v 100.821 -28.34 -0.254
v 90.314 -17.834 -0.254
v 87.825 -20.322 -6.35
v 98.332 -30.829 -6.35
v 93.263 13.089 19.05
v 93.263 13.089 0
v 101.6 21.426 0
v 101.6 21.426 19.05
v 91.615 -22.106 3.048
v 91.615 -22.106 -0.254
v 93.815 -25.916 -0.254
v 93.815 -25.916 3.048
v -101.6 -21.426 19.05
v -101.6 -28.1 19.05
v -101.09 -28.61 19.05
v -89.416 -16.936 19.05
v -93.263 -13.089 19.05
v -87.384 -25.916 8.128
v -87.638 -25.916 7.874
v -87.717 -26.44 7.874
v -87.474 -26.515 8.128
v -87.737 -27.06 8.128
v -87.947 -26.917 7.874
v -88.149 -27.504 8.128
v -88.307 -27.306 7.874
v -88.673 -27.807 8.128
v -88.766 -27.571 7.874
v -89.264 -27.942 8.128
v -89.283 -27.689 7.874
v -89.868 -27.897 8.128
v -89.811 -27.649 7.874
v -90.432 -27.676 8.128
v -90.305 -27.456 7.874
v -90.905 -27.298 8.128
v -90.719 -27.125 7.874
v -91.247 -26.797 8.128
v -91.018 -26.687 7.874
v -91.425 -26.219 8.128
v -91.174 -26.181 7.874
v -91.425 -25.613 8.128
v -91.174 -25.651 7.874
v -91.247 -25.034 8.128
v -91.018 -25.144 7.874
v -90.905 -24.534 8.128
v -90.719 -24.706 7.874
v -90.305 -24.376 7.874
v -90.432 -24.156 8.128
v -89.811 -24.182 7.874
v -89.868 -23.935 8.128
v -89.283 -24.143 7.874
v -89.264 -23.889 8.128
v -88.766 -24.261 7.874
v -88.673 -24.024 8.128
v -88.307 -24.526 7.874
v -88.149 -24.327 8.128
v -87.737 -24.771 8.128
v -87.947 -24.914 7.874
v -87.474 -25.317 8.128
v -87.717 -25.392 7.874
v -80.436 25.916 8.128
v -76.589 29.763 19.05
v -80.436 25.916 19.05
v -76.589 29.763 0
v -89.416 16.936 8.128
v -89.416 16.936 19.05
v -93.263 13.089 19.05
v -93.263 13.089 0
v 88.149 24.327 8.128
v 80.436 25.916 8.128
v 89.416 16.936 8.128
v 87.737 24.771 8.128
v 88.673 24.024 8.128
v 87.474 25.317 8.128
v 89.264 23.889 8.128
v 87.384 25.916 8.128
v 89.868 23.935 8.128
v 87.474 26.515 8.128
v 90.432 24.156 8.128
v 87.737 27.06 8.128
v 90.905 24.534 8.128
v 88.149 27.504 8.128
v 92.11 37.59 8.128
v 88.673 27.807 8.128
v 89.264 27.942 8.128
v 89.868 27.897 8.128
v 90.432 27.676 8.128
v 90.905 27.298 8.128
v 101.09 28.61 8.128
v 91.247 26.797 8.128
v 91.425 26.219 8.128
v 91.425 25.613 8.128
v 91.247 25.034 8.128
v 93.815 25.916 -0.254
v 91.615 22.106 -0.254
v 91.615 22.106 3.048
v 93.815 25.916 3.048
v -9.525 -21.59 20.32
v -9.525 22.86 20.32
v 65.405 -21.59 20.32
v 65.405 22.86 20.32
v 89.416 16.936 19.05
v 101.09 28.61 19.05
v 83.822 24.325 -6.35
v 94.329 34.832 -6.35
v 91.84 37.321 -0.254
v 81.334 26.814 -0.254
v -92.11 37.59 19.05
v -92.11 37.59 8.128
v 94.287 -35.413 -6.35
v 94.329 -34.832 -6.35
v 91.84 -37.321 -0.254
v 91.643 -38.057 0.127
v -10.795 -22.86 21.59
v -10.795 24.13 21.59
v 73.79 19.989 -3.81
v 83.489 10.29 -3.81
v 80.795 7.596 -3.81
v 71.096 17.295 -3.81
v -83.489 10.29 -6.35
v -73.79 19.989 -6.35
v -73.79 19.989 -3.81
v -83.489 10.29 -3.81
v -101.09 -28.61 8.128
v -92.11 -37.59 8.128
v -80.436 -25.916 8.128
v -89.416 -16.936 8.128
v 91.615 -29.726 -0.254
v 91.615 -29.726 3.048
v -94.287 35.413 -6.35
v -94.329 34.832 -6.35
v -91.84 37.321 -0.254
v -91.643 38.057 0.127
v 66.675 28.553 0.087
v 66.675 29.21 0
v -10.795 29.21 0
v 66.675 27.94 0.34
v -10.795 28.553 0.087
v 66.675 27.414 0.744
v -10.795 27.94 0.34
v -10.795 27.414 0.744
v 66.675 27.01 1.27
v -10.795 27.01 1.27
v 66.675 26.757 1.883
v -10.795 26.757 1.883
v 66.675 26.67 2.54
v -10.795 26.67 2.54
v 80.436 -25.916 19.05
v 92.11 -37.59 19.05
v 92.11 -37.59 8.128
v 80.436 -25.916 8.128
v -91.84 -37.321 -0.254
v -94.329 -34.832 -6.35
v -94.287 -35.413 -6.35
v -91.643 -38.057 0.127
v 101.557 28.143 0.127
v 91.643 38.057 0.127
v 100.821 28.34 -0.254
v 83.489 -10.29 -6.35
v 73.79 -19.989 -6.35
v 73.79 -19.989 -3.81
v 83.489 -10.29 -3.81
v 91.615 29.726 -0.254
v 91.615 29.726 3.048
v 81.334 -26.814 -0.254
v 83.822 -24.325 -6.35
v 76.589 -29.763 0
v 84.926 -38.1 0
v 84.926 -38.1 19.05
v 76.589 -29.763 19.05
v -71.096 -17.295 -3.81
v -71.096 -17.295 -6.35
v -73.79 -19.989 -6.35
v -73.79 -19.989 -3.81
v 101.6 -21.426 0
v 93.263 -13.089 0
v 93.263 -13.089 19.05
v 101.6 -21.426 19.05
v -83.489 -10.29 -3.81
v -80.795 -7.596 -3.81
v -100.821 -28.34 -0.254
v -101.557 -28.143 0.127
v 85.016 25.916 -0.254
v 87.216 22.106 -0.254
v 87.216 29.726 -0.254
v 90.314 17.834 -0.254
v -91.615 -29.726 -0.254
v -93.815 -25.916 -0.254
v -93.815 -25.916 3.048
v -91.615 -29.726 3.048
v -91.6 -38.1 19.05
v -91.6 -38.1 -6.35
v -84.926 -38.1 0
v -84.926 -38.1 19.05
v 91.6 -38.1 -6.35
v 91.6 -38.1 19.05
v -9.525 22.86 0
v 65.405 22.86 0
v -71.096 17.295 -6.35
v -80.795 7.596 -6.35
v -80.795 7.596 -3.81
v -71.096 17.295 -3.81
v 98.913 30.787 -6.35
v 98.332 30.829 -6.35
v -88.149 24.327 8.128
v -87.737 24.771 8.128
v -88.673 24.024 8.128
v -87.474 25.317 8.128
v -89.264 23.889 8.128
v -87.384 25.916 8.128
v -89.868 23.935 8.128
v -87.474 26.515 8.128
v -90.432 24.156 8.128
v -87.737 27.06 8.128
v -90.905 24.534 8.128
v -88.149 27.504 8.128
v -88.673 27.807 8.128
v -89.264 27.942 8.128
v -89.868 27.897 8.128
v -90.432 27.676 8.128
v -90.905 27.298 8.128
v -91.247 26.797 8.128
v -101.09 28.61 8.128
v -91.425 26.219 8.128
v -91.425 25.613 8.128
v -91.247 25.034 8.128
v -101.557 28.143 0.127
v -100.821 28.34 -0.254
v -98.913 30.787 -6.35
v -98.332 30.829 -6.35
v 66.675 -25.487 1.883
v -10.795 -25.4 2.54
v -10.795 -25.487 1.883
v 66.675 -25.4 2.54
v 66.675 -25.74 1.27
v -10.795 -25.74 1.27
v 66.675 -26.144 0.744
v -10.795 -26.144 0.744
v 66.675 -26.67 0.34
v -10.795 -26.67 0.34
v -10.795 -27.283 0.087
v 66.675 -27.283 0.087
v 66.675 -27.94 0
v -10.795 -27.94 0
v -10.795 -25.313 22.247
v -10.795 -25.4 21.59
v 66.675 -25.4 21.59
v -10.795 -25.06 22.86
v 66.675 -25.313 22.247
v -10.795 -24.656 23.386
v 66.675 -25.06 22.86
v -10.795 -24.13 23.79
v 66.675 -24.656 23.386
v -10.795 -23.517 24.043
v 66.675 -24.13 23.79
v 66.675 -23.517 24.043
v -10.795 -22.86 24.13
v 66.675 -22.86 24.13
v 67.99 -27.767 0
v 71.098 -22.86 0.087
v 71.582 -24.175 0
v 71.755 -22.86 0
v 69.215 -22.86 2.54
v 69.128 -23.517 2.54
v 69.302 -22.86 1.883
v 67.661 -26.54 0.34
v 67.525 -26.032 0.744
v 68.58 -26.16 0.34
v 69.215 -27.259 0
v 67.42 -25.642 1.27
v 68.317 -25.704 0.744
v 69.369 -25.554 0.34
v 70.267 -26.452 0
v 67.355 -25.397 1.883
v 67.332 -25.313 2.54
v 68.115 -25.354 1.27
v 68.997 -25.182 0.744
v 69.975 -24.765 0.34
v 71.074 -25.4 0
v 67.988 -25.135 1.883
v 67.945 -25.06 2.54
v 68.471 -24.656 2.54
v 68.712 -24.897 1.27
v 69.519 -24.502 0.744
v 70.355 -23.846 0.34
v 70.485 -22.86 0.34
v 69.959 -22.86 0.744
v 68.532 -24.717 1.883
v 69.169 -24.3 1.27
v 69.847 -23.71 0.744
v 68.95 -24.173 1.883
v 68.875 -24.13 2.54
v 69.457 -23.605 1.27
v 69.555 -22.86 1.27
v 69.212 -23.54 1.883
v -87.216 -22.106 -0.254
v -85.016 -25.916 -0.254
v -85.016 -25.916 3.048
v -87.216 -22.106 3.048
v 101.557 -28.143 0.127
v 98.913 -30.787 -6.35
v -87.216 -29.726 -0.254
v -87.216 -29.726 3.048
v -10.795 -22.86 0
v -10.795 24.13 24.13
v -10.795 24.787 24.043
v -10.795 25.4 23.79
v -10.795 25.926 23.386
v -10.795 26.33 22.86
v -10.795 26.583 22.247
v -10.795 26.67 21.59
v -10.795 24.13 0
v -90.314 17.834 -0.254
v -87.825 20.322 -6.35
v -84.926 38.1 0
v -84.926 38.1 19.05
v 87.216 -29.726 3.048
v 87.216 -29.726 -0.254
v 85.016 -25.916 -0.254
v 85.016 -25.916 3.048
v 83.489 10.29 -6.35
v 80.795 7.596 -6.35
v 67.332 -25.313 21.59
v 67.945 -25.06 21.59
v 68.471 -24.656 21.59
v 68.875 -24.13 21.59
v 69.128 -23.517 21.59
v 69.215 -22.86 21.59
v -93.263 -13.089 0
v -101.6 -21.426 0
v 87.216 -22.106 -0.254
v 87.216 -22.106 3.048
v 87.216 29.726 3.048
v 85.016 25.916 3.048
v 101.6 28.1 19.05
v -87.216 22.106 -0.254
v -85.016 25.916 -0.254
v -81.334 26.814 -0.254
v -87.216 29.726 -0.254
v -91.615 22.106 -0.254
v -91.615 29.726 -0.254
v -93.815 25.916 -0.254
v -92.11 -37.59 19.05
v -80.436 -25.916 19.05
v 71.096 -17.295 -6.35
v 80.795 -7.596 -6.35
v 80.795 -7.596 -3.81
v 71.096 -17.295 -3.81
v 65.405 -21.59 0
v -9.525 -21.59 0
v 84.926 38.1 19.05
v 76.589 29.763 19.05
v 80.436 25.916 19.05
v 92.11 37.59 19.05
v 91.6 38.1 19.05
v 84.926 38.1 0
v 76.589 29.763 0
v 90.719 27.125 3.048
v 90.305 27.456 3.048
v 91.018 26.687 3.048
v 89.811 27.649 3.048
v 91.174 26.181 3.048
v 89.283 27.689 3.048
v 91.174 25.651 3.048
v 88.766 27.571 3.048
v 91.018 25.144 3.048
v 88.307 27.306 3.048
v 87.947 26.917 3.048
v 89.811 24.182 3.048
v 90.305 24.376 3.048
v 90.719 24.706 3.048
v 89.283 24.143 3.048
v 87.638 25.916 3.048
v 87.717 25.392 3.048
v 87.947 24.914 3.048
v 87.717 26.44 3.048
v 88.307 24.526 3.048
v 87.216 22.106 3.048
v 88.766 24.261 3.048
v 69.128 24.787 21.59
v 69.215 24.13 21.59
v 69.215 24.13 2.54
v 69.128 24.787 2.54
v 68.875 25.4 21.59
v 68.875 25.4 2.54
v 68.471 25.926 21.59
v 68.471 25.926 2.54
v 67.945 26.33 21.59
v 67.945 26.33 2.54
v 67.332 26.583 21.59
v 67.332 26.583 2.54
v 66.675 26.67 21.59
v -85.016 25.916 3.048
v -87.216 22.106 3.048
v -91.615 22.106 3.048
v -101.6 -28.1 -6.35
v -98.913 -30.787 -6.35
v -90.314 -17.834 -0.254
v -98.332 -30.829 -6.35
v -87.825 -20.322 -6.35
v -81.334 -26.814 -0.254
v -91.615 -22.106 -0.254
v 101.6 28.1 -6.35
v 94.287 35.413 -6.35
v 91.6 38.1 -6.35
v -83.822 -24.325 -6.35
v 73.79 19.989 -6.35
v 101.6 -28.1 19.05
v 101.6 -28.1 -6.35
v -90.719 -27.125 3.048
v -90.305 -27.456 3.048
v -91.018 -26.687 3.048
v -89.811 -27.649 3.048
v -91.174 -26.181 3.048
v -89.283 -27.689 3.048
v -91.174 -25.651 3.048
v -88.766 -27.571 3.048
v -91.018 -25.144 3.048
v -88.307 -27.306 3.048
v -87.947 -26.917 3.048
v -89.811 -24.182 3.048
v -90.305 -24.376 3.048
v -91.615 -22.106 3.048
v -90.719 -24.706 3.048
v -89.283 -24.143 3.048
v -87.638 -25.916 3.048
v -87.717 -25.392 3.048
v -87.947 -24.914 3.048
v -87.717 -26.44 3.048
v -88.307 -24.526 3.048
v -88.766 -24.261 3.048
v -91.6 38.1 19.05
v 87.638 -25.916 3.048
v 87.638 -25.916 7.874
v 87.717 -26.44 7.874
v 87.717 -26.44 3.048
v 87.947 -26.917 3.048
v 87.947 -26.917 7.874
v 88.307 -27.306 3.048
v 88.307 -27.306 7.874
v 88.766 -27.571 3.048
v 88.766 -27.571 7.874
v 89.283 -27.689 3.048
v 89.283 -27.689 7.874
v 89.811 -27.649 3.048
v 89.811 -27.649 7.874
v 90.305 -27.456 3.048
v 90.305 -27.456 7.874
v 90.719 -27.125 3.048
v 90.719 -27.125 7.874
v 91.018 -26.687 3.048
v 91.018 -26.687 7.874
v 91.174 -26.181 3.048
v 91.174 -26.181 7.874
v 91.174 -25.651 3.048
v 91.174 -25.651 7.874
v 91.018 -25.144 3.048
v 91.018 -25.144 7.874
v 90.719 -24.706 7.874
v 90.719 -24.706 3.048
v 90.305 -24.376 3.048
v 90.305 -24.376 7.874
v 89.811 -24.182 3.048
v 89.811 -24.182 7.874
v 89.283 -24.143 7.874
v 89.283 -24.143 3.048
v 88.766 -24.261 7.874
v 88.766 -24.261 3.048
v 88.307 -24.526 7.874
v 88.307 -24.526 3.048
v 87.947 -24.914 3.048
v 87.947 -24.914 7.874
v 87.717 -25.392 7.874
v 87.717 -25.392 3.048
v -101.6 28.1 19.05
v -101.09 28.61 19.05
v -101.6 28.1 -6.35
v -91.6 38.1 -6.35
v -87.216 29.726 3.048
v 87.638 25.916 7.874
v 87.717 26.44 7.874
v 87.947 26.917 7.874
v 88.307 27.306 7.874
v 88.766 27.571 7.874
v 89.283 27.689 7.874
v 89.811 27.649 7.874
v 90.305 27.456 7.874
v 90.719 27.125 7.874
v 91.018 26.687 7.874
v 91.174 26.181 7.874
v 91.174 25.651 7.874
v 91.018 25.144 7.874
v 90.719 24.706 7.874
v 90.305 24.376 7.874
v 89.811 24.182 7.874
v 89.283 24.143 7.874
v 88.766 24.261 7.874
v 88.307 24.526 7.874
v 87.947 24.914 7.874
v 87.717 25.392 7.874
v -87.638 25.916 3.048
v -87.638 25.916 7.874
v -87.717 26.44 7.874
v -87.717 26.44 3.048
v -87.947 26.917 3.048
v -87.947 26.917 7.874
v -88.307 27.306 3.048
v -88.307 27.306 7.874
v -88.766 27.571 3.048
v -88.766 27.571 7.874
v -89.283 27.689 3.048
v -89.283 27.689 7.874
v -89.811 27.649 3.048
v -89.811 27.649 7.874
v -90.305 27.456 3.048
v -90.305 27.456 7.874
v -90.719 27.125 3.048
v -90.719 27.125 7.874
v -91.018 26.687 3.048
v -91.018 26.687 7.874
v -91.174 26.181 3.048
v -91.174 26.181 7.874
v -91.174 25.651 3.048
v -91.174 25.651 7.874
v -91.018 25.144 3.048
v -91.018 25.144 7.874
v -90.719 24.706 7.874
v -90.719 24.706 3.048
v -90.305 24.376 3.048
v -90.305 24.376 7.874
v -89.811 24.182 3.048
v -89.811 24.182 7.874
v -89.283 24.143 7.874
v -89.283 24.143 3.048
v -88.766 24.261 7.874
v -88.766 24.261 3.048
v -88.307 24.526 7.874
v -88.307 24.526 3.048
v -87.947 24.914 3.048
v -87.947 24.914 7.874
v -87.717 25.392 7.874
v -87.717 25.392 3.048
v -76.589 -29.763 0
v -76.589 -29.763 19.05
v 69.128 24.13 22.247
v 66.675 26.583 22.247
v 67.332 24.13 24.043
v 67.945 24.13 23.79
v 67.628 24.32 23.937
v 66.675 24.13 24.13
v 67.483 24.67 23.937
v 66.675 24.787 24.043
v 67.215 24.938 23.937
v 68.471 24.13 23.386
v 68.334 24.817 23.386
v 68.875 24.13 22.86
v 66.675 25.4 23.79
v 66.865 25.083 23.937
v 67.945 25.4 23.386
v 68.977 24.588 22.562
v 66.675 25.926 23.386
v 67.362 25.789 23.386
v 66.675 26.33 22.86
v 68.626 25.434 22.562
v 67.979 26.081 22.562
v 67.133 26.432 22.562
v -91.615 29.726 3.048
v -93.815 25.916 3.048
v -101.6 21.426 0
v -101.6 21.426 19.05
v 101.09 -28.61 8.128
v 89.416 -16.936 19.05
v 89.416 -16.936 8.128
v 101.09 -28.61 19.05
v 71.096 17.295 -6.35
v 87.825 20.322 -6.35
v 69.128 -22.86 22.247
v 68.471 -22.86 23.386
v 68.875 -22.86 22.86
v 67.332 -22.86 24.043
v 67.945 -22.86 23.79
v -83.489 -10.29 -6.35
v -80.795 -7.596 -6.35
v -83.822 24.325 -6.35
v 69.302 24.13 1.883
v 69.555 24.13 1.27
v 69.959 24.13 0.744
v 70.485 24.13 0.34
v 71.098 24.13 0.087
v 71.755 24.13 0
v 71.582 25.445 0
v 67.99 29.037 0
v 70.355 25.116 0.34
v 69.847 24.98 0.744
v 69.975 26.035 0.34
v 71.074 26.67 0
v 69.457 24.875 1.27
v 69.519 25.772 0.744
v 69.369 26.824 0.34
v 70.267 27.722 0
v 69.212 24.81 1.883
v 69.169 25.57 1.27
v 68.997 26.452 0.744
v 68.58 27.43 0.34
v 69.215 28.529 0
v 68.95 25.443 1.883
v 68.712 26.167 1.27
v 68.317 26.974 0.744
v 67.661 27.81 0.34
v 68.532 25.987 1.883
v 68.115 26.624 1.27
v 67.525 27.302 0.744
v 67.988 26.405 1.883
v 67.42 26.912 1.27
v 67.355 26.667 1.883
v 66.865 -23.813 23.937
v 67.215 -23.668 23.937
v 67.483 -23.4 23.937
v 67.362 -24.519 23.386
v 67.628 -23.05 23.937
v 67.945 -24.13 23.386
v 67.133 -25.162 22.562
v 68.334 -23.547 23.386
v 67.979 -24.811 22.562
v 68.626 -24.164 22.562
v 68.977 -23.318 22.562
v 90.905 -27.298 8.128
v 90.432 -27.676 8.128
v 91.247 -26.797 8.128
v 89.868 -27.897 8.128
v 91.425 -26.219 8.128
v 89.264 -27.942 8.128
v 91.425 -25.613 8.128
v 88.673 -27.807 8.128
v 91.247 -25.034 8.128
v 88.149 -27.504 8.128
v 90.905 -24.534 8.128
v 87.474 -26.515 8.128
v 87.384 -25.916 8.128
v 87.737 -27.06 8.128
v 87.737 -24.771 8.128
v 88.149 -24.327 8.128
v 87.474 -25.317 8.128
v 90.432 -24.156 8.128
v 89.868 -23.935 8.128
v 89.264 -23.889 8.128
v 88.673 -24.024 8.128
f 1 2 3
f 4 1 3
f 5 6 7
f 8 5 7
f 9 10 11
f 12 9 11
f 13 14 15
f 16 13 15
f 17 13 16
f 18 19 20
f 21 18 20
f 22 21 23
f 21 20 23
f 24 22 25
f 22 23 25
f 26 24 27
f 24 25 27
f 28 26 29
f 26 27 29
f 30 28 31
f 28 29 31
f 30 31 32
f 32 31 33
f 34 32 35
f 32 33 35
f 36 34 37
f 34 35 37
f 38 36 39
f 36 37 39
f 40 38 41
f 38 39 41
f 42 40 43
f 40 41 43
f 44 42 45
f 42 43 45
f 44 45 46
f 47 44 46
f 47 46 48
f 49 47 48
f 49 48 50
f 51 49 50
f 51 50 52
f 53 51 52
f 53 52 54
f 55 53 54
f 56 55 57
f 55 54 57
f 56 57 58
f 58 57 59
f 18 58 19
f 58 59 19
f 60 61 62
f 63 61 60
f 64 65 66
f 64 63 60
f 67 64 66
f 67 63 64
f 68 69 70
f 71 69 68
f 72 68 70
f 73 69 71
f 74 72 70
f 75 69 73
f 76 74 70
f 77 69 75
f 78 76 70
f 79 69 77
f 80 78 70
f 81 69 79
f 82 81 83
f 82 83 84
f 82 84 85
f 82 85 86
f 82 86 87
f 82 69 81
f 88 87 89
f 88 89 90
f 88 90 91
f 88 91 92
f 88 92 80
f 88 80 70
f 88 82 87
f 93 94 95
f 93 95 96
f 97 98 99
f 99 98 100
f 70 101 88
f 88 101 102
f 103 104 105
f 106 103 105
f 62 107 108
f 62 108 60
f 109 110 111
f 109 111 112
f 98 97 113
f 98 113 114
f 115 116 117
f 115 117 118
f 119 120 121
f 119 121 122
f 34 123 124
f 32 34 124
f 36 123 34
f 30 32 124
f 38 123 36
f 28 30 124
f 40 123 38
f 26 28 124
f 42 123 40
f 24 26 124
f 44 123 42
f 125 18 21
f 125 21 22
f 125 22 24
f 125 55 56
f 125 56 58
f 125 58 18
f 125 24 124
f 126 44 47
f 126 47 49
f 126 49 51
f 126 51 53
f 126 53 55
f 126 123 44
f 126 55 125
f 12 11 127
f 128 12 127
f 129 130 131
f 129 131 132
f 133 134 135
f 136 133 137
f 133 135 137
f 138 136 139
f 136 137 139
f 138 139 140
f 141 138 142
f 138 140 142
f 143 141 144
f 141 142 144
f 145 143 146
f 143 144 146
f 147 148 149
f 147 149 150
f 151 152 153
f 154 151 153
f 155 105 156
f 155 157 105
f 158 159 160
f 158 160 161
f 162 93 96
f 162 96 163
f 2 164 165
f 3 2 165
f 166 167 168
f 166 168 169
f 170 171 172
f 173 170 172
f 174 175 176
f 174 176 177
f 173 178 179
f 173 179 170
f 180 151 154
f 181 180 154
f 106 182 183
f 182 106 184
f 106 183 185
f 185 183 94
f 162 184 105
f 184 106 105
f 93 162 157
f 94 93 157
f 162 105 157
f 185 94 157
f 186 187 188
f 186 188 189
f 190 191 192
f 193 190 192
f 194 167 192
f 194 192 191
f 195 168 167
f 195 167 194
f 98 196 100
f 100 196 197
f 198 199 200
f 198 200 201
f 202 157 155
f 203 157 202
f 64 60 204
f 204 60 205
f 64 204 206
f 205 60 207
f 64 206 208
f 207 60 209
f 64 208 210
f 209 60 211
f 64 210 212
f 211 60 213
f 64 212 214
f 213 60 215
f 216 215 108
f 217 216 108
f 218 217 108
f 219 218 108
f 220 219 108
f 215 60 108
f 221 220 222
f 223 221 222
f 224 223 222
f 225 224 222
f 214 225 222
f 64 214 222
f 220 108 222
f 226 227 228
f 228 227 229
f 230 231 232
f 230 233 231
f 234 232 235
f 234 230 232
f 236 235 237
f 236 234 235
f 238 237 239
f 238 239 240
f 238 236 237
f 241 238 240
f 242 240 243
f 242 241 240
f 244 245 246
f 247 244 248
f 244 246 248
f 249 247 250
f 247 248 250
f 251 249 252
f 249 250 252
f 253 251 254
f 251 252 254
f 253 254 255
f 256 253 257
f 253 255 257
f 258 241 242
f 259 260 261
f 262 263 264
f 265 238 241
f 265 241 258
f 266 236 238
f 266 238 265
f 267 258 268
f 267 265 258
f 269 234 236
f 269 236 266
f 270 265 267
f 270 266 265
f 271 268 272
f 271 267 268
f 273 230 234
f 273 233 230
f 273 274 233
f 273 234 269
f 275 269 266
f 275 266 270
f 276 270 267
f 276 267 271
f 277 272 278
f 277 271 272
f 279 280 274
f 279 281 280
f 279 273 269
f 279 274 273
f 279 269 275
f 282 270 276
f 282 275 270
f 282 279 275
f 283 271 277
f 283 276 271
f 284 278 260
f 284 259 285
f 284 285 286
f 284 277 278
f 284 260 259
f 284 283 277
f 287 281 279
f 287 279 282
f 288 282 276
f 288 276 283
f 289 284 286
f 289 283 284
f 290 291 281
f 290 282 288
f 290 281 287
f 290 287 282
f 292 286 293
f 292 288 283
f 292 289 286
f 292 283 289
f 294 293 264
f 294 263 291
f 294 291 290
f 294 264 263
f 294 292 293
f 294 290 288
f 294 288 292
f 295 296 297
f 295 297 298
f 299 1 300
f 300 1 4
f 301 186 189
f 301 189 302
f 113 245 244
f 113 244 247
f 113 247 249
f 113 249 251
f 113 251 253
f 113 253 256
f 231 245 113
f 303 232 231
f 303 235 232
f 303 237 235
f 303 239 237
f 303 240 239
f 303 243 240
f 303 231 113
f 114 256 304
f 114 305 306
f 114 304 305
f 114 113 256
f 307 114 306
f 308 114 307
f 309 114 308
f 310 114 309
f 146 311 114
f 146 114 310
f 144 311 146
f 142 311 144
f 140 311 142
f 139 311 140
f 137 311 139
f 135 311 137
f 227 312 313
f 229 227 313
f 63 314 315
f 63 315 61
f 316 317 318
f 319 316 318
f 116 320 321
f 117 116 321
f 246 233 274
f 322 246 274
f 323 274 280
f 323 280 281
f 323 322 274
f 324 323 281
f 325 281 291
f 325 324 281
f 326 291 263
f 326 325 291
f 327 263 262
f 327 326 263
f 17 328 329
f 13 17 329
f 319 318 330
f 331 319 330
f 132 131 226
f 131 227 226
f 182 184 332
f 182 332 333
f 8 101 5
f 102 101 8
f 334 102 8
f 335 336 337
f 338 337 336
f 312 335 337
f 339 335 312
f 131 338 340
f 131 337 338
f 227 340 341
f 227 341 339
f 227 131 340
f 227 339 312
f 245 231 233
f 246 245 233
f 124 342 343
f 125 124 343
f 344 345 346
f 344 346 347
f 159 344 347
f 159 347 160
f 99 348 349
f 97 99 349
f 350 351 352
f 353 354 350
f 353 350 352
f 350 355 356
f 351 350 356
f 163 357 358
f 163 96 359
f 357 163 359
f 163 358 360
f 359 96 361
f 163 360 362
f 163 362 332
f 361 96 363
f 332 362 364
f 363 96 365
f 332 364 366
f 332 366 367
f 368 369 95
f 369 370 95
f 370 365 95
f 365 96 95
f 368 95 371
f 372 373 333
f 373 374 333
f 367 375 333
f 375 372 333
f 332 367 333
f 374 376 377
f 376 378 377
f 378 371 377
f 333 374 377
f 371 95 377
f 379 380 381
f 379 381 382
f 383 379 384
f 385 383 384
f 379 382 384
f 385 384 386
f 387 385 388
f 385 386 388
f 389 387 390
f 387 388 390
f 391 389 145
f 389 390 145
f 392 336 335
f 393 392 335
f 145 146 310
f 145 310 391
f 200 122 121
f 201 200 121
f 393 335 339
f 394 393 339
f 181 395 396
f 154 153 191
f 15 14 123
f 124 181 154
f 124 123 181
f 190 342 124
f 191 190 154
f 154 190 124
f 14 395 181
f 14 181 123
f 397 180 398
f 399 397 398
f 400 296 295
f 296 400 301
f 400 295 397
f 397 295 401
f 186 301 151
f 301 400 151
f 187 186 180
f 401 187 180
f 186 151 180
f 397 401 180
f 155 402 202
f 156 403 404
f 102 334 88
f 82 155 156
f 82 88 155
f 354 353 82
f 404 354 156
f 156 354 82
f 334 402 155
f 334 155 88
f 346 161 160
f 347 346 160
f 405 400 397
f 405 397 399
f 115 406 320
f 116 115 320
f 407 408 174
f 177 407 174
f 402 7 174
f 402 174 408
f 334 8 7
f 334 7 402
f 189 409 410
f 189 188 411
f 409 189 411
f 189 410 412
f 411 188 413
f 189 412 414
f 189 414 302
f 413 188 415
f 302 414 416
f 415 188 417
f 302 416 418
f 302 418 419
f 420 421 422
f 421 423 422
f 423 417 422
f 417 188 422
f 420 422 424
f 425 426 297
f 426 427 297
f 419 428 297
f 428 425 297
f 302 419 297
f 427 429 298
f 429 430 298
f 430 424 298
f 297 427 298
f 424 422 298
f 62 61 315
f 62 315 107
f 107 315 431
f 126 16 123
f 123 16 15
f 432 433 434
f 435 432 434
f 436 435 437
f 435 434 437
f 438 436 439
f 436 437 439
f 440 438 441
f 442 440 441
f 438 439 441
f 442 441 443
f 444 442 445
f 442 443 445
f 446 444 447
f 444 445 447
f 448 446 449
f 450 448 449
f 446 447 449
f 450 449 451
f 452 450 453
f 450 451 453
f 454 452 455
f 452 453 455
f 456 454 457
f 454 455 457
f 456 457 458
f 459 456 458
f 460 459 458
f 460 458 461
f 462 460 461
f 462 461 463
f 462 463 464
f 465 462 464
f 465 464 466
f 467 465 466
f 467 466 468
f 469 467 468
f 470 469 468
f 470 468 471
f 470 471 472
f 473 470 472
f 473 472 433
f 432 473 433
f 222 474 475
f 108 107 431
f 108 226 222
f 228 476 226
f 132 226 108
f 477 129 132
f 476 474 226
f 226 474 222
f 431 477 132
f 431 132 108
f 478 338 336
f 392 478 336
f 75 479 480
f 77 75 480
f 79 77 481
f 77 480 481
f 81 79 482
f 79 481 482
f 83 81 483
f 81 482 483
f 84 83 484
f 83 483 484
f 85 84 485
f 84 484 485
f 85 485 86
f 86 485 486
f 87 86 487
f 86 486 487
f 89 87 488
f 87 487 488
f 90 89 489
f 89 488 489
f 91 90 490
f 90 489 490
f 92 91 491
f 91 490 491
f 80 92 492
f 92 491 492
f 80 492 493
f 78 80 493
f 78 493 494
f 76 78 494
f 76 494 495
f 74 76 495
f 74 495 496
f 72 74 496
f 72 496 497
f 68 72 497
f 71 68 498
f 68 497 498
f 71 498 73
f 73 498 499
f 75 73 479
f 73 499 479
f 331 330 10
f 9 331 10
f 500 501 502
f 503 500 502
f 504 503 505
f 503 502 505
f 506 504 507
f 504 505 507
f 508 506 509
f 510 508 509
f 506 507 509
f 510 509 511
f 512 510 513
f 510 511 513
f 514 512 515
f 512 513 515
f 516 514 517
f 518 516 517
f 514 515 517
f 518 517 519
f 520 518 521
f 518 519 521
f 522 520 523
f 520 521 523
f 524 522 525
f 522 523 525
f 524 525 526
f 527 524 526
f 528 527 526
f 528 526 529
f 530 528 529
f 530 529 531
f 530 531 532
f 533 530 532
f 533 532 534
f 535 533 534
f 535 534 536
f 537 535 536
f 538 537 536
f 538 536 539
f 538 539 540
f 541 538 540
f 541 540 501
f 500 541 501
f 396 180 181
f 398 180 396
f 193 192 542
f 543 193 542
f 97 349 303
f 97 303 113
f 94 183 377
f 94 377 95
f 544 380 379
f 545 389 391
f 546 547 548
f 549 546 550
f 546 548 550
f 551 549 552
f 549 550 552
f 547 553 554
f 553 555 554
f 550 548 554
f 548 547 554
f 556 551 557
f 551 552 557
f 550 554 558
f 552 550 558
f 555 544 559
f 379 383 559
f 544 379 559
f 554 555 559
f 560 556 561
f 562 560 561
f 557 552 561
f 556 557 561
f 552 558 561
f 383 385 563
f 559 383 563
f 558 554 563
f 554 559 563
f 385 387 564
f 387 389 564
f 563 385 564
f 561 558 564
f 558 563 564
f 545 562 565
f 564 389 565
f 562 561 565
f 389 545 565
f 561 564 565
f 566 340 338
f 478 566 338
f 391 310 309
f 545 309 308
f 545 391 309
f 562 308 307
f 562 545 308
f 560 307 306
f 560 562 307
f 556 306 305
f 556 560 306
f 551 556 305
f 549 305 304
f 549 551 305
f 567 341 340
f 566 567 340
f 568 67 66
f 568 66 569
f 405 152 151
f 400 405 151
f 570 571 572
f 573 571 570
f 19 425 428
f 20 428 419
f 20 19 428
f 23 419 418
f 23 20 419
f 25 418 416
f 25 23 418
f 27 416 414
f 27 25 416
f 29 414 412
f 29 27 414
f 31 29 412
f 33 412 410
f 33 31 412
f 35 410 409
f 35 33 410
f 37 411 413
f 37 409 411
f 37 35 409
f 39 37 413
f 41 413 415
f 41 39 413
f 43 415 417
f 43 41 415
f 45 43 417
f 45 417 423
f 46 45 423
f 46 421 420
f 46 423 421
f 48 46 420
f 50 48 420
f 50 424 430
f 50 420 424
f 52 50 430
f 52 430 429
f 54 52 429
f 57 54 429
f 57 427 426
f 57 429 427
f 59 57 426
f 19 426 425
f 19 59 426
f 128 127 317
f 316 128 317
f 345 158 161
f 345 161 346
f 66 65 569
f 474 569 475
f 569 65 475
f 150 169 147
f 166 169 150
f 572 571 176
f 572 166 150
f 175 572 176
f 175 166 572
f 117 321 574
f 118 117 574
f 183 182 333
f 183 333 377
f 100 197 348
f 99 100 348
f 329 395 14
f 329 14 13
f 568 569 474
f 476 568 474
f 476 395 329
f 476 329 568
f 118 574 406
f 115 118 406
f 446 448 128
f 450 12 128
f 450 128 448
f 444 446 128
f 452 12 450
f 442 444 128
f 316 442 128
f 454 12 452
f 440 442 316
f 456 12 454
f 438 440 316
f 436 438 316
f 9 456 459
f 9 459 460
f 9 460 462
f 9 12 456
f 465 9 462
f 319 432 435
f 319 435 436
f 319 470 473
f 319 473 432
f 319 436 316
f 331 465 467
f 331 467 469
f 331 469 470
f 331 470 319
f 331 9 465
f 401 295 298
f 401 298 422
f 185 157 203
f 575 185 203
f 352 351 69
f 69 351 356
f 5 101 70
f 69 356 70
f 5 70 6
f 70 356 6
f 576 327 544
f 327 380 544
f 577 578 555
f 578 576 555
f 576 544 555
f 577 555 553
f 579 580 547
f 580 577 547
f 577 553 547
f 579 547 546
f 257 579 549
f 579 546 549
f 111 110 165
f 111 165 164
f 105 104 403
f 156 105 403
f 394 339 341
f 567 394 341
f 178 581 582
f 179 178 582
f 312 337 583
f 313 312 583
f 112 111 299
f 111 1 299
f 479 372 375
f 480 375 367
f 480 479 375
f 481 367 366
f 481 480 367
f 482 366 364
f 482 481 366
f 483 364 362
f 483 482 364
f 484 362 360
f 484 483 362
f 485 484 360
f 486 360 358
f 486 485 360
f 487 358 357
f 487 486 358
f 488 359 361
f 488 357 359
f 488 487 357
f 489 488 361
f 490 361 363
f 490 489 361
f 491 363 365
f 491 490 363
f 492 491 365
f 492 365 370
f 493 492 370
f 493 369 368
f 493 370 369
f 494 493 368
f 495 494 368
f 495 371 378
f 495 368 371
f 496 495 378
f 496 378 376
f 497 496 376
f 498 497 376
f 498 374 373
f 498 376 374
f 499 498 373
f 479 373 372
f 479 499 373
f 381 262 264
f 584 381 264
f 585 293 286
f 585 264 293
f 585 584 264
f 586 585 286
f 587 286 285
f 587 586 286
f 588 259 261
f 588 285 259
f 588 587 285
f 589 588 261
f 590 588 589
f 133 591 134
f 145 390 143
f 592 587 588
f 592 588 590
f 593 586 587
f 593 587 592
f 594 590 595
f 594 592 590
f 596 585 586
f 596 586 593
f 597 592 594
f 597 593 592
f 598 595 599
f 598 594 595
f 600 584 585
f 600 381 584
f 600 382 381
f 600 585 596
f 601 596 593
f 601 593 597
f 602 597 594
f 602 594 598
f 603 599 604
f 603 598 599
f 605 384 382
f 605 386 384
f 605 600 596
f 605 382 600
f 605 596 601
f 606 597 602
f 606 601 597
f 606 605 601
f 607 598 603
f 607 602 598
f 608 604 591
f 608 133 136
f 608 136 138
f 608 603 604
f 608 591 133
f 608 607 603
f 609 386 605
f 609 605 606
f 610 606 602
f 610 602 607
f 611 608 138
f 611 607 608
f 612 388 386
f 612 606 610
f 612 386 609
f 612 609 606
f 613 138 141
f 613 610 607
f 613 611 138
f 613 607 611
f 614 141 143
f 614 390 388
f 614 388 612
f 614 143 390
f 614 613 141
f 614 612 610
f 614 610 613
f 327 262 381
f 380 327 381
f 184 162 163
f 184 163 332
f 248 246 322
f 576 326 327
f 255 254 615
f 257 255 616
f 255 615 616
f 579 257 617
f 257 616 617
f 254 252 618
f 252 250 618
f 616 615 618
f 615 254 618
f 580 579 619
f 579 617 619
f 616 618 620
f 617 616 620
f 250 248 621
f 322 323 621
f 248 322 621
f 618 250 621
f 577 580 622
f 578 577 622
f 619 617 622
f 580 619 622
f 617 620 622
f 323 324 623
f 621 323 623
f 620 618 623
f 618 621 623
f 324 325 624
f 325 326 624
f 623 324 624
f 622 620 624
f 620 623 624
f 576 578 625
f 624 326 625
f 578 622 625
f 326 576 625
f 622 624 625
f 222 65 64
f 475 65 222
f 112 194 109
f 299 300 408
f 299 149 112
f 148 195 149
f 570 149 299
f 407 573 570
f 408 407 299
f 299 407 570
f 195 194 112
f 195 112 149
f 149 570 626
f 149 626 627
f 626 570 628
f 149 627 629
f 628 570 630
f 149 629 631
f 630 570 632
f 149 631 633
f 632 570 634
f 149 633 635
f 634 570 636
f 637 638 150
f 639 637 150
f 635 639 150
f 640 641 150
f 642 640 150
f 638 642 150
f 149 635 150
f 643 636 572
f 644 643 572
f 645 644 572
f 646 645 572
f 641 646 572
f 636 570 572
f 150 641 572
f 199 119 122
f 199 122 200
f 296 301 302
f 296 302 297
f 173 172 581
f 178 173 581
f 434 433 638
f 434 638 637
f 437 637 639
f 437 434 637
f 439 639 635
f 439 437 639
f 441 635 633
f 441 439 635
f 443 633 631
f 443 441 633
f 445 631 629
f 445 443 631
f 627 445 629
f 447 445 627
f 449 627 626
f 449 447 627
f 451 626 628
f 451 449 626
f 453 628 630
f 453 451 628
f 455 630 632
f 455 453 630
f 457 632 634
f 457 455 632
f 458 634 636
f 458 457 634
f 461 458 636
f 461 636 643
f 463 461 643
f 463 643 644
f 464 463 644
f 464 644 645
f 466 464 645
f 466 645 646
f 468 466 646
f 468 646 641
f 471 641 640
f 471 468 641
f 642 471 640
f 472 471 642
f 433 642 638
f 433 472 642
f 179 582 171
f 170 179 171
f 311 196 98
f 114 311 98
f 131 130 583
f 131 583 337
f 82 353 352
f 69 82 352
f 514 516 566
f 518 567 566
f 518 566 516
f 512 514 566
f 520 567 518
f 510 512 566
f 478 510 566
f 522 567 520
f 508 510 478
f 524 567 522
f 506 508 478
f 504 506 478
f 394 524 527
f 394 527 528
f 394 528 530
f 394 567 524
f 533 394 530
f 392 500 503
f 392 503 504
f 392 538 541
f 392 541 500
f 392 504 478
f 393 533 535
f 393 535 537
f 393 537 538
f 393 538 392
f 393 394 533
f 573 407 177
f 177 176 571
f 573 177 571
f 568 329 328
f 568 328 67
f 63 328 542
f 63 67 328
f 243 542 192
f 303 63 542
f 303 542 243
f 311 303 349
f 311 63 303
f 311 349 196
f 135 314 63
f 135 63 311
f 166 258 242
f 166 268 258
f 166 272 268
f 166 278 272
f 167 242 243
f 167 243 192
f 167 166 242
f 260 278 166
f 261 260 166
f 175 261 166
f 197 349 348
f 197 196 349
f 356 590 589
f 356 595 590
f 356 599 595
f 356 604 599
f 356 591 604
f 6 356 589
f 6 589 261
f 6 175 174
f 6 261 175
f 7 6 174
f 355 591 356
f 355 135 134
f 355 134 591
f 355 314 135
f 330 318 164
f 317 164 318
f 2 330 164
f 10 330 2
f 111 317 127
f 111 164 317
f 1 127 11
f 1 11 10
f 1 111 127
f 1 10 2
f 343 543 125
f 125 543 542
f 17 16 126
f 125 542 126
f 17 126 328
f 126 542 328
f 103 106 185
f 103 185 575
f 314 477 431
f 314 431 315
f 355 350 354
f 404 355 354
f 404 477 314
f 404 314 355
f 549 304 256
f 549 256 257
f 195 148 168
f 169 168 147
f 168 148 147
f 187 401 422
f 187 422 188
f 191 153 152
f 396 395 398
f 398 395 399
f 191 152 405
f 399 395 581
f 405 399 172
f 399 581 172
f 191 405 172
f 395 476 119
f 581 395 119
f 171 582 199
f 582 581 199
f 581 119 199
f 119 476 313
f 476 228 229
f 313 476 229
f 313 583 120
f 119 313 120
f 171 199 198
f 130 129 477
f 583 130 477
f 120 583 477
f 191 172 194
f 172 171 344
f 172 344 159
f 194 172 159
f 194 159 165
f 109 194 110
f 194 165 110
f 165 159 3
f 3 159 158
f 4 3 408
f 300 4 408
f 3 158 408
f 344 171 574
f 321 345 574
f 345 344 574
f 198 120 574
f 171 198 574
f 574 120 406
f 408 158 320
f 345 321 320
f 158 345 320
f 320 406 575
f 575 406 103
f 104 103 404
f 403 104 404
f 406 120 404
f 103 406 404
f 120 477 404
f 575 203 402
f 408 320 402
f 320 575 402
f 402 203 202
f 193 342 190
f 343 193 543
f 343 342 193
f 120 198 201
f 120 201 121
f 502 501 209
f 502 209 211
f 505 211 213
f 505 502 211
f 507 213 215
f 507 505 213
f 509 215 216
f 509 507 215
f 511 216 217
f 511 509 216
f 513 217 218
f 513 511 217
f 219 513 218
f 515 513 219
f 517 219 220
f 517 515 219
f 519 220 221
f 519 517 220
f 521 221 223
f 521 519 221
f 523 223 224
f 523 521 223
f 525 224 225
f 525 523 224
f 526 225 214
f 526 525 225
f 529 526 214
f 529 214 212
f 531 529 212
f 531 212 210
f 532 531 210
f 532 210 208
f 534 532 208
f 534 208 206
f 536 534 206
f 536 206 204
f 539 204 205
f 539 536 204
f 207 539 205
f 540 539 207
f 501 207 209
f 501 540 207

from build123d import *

# Parameters (mm, degrees)
BOSS_EXTRUDE1_DEPTH     = 27.432
BOSS_EXTRUDE2_DEPTH     = 5.08
SKETCH4_R               = 1.524
CUT_EXTRUDE1_DEPTH      = 2.286
SKETCH4_4_R             = 1.524
CUT_EXTRUDE2_DEPTH      = 63.630575033
BOSS_EXTRUDE3_DEPTH     = 3.81
FILLET1_R               = 2.54
CHAMFER3_SIZE           = 1.27
CHAMFER4_SIZE           = 0.254
SKETCH8_W               = 101.6
SKETCH8_H               = 44.45
CUT_EXTRUDE3_DEPTH      = 5.08
CHAMFER5_SIZE           = 1.27
BOSS_EXTRUDE4_DEPTH     = 6.35
FILLET2_R               = 1.27
BOSS_EXTRUDE5_DEPTH     = 19.05
CUT_EXTRUDE4_DEPTH      = 15.24
MIRROR3_COPY_1_DEPTH    = 15.24
CHAMFER7_SIZE           = 0.381
CUT_EXTRUDE6_DEPTH      = 2.54
MIRROR5_COPY_1_DEPTH    = 2.54
CUT_EXTRUDE7_DEPTH      = 10.922
SKETCH18_R              = 1.778
CUT_EXTRUDE8_DEPTH      = 8.382
MIRROR7_COPY_1_SKETCH_R = 1.778
MIRROR7_COPY_1_DEPTH    = 8.382
SKETCH19_W              = 135.869666512
SKETCH19_H              = 67.345799606
CUT_EXTRUDE9_DEPTH      = 31.242
BOSS_EXTRUDE6_DEPTH     = 20.32
SKETCH21_W              = 80.01
SKETCH21_H              = 52.07
BOSS_EXTRUDE7_DEPTH     = 3.81
FILLET3_R               = 2.54
CHAMFER8_SIZE           = 1.27
CHAMFER9_SIZE           = 0.254
CUT_EXTRUDE10_DEPTH     = 3.302
MIRROR9_COPY_1_DEPTH    = 3.302


with BuildPart() as part:
    # Sketch1 → Boss-Extrude1 (new body)
    with BuildSketch(Plane(origin=(10.858740921, 0, 0), x_dir=(1, 0, 0), z_dir=(0, 0, 1))):
        Polygon((-52.705, 25.4), (-52.705, 21.59), (48.895, 21.59), (48.895, -22.86), (-52.705, -22.86), (-52.705, -25.4), (52.705, -25.4), (52.705, 25.4), align=None)
    extrude(amount=BOSS_EXTRUDE1_DEPTH)

    # Sketch1<3> → Boss-Extrude2 (add)
    with BuildSketch(Plane(origin=(10.858740921, 0, 0), x_dir=(1, 0, 0), z_dir=(0, 0, 1))):
        Polygon((48.895, 21.59), (-52.705, 21.59), (-52.705, 13.97), (-6.985, 13.97), (-6.985, -6.35), (-52.705, -6.35), (-52.705, -22.86), (48.895, -22.86), align=None)
    extrude(amount=BOSS_EXTRUDE2_DEPTH)

    # Sketch4 → Cut-Extrude1 (cut)
    # profile 1 of 4: a face of its own
    with BuildSketch(Plane(origin=(10.858740921, 0, 5.08), x_dir=(1, 0, 0), z_dir=(0, 0, 1))):
        Polygon((-44.785877438, 21.59), (-47.924122562, 21.59), (-49.493245123, 18.8722), (-47.924122562, 16.1544), (-44.785877438, 16.1544), (-43.216754877, 18.8722), align=None)
        with Locations((-46.355, 18.8722)):
            Circle(SKETCH4_R, mode=Mode.SUBTRACT)
    # profile 2 of 4: a face of its own
    with BuildSketch(Plane(origin=(10.858740921, 0, 5.08), x_dir=(1, 0, 0), z_dir=(0, 0, 1))):
        Polygon((21.126640721, 16.1544), (17.988395597, 16.1544), (16.419273036, 18.8722), (17.988395597, 21.59), (21.126640721, 21.59), (22.695763282, 18.8722), align=None)
        with Locations((19.557518159, 18.8722)):
            Circle(SKETCH4_R, mode=Mode.SUBTRACT)
    # profile 3 of 4: a face of its own
    with BuildSketch(Plane(origin=(10.858740921, 0, 5.08), x_dir=(1, 0, 0), z_dir=(0, 0, 1))):
        Polygon((22.695763282, -18.8722), (21.126640721, -16.1544), (17.988395597, -16.1544), (16.419273036, -18.8722), (17.988395597, -21.59), (21.126640721, -21.59), align=None)
        with Locations((19.557518159, -18.8722)):
            Circle(SKETCH4_R, mode=Mode.SUBTRACT)
    # profile 4 of 4: a face of its own
    with BuildSketch(Plane(origin=(10.858740921, 0, 5.08), x_dir=(1, 0, 0), z_dir=(0, 0, 1))):
        Polygon((-49.493245123, -18.8722), (-47.924122562, -16.1544), (-44.785877438, -16.1544), (-43.216754877, -18.8722), (-44.785877438, -21.59), (-47.924122562, -21.59), align=None)
        with Locations((-46.355, -18.8722)):
            Circle(SKETCH4_R, mode=Mode.SUBTRACT)
    extrude(amount=-CUT_EXTRUDE1_DEPTH, mode=Mode.SUBTRACT)

    # Sketch4<4> → Cut-Extrude2 (cut, through all)
    with BuildSketch(Plane(origin=(10.858740921, 0, 5.08), x_dir=(1, 0, 0), z_dir=(0, 0, 1))):
        with Locations((-46.355, 18.8722)):
            Circle(SKETCH4_4_R)
        with Locations((19.557518159, 18.8722)):
            Circle(SKETCH4_4_R)
        with Locations((-46.355, -18.8722)):
            Circle(SKETCH4_4_R)
        with Locations((19.557518159, -18.8722)):
            Circle(SKETCH4_4_R)
    extrude(amount=-CUT_EXTRUDE2_DEPTH, mode=Mode.SUBTRACT)

    # Sketch7 → Boss-Extrude3 (add)
    with BuildSketch(Plane(origin=(10.858740921, 0, 27.432), x_dir=(1, 0, 0), z_dir=(0, 0, 1))):
        Polygon((-52.705, 25.4), (52.705, 25.4), (52.705, -25.4), (-52.705, -25.4), (-52.705, -6.35), (-46.355, -6.35), (-46.355, 6.35), (-52.705, 6.35), align=None)
    extrude(amount=BOSS_EXTRUDE3_DEPTH)

    # Fillet1
    fillet1_edges = [part.edges().sort_by_distance(p)[0] for p in [
        (63.563740921, 25.4, 15.621),
        (63.563740921, -25.4, 15.621),
        (10.858740921, -25.4, 31.242),
        (63.563740921, 0, 31.242),
        (10.858740921, 25.4, 31.242),
    ]]
    fillet(fillet1_edges, radius=FILLET1_R)

    # Chamfer3
    chamfer3_edges = [part.edges().sort_by_distance(p)[0] for p in [
        (-41.846259079, 13.97, 27.432),
        (-41.846259079, 6.35, 29.337),
        (-41.846259079, 21.59, 16.256),
        (-41.846259079, -14.605, 27.432),
        (-41.846259079, -6.35, 29.337),
        (-38.671259079, 6.35, 31.242),
        (-35.496259079, 0, 31.242),
        (-38.671259079, -6.35, 31.242),
        (-41.846259079, -22.86, 16.256),
    ]]
    chamfer(chamfer3_edges, length=CHAMFER3_SIZE)

    # Chamfer4
    chamfer4_edges = [part.edges().sort_by_distance(p)[0] for p in [
        (28.892259079, 18.8722, 0),
        (-37.020259079, -18.8722, 0),
        (28.892259079, -18.8722, 0),
        (-37.020259079, 18.8722, 0),
    ]]
    chamfer(chamfer4_edges, length=CHAMFER4_SIZE)

    # Sketch8 → Cut-Extrude3 (cut)
    with BuildSketch(Plane(origin=(10.858740921, 0, 5.08), x_dir=(1, 0, 0), z_dir=(0, 0, 1))):
        with Locations((-1.905, -0.635)):
            Rectangle(SKETCH8_W, SKETCH8_H)
    extrude(amount=-CUT_EXTRUDE3_DEPTH, mode=Mode.SUBTRACT)

    # Chamfer5
    chamfer5_edges = [part.edges().sort_by_distance(p)[0] for p in [
        (-41.846259079, -22.86, 2.54),
        (-41.846259079, 21.59, 2.54),
    ]]
    chamfer(chamfer5_edges, length=CHAMFER5_SIZE)

    # Sketch9 → Boss-Extrude4 (add)
    with BuildSketch(Plane(origin=(10.858740921, 0, 0), x_dir=(-1, 0, 0), z_dir=(0, 0, -1))):
        Polygon((-90.741259079, 28.1), (-80.741259079, 38.1), (102.458740921, 38.1), (112.458740921, 28.1), (112.458740921, -28.1), (102.458740921, -38.1), (-80.741259079, -38.1), (-90.741259079, -28.1), align=None)
    extrude(amount=BOSS_EXTRUDE4_DEPTH)

    # Fillet2
    fillet2_edges = [part.edges().sort_by_distance(p)[0] for p in [
        (9.588740921, -25.4, 0),
        (63.563740921, 0, 0),
        (9.588740921, 25.4, 0),
        (62.819792145, 24.656051224, 0),
        (62.819792145, -24.656051224, 0),
    ]]
    fillet(fillet2_edges, radius=FILLET2_R)

    # Sketch11 → Boss-Extrude5 (add)
    with BuildSketch(Plane.XY):
        Polygon((-101.6, 28.1), (-91.6, 38.1), (-84.925667043, 38.1), (-76.588500564, 29.762833521), (-93.262833521, 13.088500564), (-101.6, 21.425667043), align=None)
        Polygon((84.925667043, 38.1), (76.588500564, 29.762833521), (93.262833521, 13.088500564), (101.6, 21.425667043), (101.6, 28.1), (91.6, 38.1), align=None)
        Polygon((91.6, -38.1), (84.925667043, -38.1), (76.588500564, -29.762833521), (93.262833521, -13.088500564), (101.6, -21.425667043), (101.6, -28.1), align=None)
        Polygon((-84.925667043, -38.1), (-76.588500564, -29.762833521), (-93.262833521, -13.088500564), (-101.6, -21.425667043), (-101.6, -28.1), (-91.6, -38.1), align=None)
    extrude(amount=BOSS_EXTRUDE5_DEPTH)

    # Sketch13 → Cut-Extrude4 (cut)
    with BuildSketch(Plane(origin=(-64.85, 64.85, 0), x_dir=(0, 0, 1), z_dir=(-0.7071067811865477, 0.7071067811865474, 0))):
        Polygon((-6.35, -44.901280605), (-6.35, -42.070807846), (-0.254, -38.551280605), (-0.254, -51.251280605), (-6.35, -47.731753364), align=None)
    cut_extrude4 = extrude(amount=-CUT_EXTRUDE4_DEPTH, mode=Mode.SUBTRACT)

    # Mirror2: Cut-Extrude4 across plane
    add(cut_extrude4.mirror(Plane.ZX), mode=Mode.SUBTRACT)

    # Mirror3: Cut-Extrude4 across plane
    add(cut_extrude4.mirror(Plane(origin=(0, 0, 0), x_dir=(0, 0, 1), z_dir=(1, 0, 0))), mode=Mode.SUBTRACT)

    # Mirror3 copy 1 sketch → Mirror3 copy 1 (cut)
    with BuildSketch(Plane(origin=(64.85, -64.85, 0), x_dir=(0, 0, 1), z_dir=(0.7071067811865477, -0.7071067811865474, 0))):
        Polygon((-6.35, -44.901280605), (-6.35, -42.070807846), (-0.254, -38.551280605), (-0.254, -51.251280605), (-6.35, -47.731753364), align=None)
    extrude(amount=-MIRROR3_COPY_1_DEPTH, mode=Mode.SUBTRACT)

    # Chamfer7
    chamfer7_edges = [part.edges().sort_by_distance(p)[0] for p in [
        (-99.845787271, 29.854212729, -3.302),
        (-96.6, 33.1, -0.254),
        (-93.354212729, 36.345787271, -3.302),
        (-99.845787271, -29.854212729, -3.302),
        (-96.6, -33.1, -0.254),
        (-93.354212729, -36.345787271, -3.302),
        (99.845787271, 29.854212729, -3.302),
        (96.6, 33.1, -0.254),
        (93.354212729, 36.345787271, -3.302),
        (99.845787271, -29.854212729, -3.302),
        (96.6, -33.1, -0.254),
        (93.354212729, -36.345787271, -3.302),
    ]]
    chamfer(chamfer7_edges, length=CHAMFER7_SIZE)

    # Sketch16 → Cut-Extrude6 (cut)
    with BuildSketch(Plane(origin=(0, 0, -6.35), x_dir=(-1, 0, 0), z_dir=(0, 0, -1))):
        Polygon((71.096072616, 17.294749227), (73.790149452, 19.988826063), (83.488826063, 10.290149452), (80.794749227, 7.596072616), align=None)
    cut_extrude6 = extrude(amount=-CUT_EXTRUDE6_DEPTH, mode=Mode.SUBTRACT)

    # Mirror4: Cut-Extrude6 across plane
    add(cut_extrude6.mirror(Plane.ZX), mode=Mode.SUBTRACT)

    # Mirror5: Cut-Extrude6 across plane
    add(cut_extrude6.mirror(Plane(origin=(0, 0, 0), x_dir=(0, 0, 1), z_dir=(1, 0, 0))), mode=Mode.SUBTRACT)

    # Mirror5 copy 1 sketch → Mirror5 copy 1 (cut)
    with BuildSketch(Plane(origin=(0, 0, -6.35), x_dir=(1, 0, 0), z_dir=(0, 0, -1))):
        Polygon((71.096072616, 17.294749227), (73.790149452, 19.988826063), (83.488826063, 10.290149452), (80.794749227, 7.596072616), align=None)
    extrude(amount=-MIRROR5_COPY_1_DEPTH, mode=Mode.SUBTRACT)

    # Sketch17 → Cut-Extrude7 (cut)
    with BuildSketch(Plane.XY.offset(19.05)):
        Polygon((-96.6, 33.1), (-92.109871939, 37.590128061), (-80.435538982, 25.915795103), (-89.415795103, 16.935538982), (-101.090128061, 28.609871939), align=None)
        Polygon((-80.435538982, -25.915795103), (-89.415795103, -16.935538982), (-101.090128061, -28.609871939), (-96.6, -33.1), (-92.109871939, -37.590128061), align=None)
        Polygon((92.109871939, -37.590128061), (80.435538982, -25.915795103), (89.415795103, -16.935538982), (101.090128061, -28.609871939), (96.6, -33.1), align=None)
        Polygon((80.435538982, 25.915795103), (89.415795103, 16.935538982), (101.090128061, 28.609871939), (96.6, 33.1), (92.109871939, 37.590128061), align=None)
    extrude(amount=-CUT_EXTRUDE7_DEPTH, mode=Mode.SUBTRACT)

    # Sketch18 → Cut-Extrude8 (cut)
    with BuildSketch(Plane.XY.offset(8.128)):
        with Locations((-89.415795103, 25.915795103)):
            Circle(SKETCH18_R)
    cut_extrude8 = extrude(amount=-CUT_EXTRUDE8_DEPTH, mode=Mode.SUBTRACT)

    # Mirror6: Cut-Extrude8 across plane
    add(cut_extrude8.mirror(Plane.ZX), mode=Mode.SUBTRACT)

    # Mirror7: Cut-Extrude8 across plane
    add(cut_extrude8.mirror(Plane(origin=(0, 0, 0), x_dir=(0, 0, 1), z_dir=(1, 0, 0))), mode=Mode.SUBTRACT)

    # Mirror7 copy 1 sketch → Mirror7 copy 1 (cut)
    with BuildSketch(Plane(origin=(0, 0, 8.128), x_dir=(-1, 0, 0), z_dir=(0, 0, 1))):
        with Locations((-89.415795103, 25.915795103)):
            Circle(MIRROR7_COPY_1_SKETCH_R)
    extrude(amount=-MIRROR7_COPY_1_DEPTH, mode=Mode.SUBTRACT)

    # Sketch19 → Cut-Extrude9 (cut)
    with BuildSketch(Plane.XY.offset(31.242)):
        Rectangle(SKETCH19_W, SKETCH19_H)
    extrude(amount=-CUT_EXTRUDE9_DEPTH, mode=Mode.SUBTRACT)

    # Sketch20 → Boss-Extrude6 (add)
    with BuildSketch(Plane.XY):
        Polygon((65.405, 22.86), (65.405, -21.59), (-10.795, -21.59), (-10.795, -25.4), (69.215, -25.4), (69.215, 26.67), (-10.795, 26.67), (-10.795, 22.86), align=None)
    extrude(amount=BOSS_EXTRUDE6_DEPTH)

    # Sketch21 → Boss-Extrude7 (add)
    with BuildSketch(Plane.XY.offset(20.32)):
        with Locations((29.21, 0.635)):
            Rectangle(SKETCH21_W, SKETCH21_H)
    extrude(amount=BOSS_EXTRUDE7_DEPTH)

    # Fillet3
    fillet3_edges = [part.edges().sort_by_distance(p)[0] for p in [
        (29.21, -25.4, 0),
        (69.215, 0.635, 0),
        (69.215, -25.4, 12.065),
        (29.21, 26.67, 0),
        (69.215, 26.67, 12.065),
        (29.21, -25.4, 24.13),
        (69.215, 0.635, 24.13),
        (29.21, 26.67, 24.13),
    ]]
    fillet(fillet3_edges, radius=FILLET3_R)

    # Chamfer8
    chamfer8_edges = [part.edges().sort_by_distance(p)[0] for p in [
        (-10.795, 22.86, 10.16),
        (-10.795, -21.59, 10.16),
        (-10.795, 0.635, 20.32),
    ]]
    chamfer(chamfer8_edges, length=CHAMFER8_SIZE)

    # Chamfer9
    chamfer9_edges = [part.edges().sort_by_distance(p)[0] for p in [
        (-91.193795103, 25.915795103, 8.128),
        (-91.193795103, -25.915795103, 8.128),
        (91.193795103, 25.915795103, 8.128),
        (91.193795103, -25.915795103, 8.128),
    ]]
    chamfer(chamfer9_edges, length=CHAMFER9_SIZE)

    # Sketch22 → Cut-Extrude10 (cut)
    with BuildSketch(Plane(origin=(0, 0, -0.254), x_dir=(-1, 0, 0), z_dir=(0, 0, -1))):
        Polygon((-85.016386052, -25.915795103), (-87.216090578, -22.105795103), (-91.615499629, -22.105795103), (-93.815204154, -25.915795103), (-91.615499629, -29.725795103), (-87.216090578, -29.725795103), align=None)
    cut_extrude10 = extrude(amount=-CUT_EXTRUDE10_DEPTH, mode=Mode.SUBTRACT)

    # Mirror8: Cut-Extrude10 across plane
    add(cut_extrude10.mirror(Plane.ZX), mode=Mode.SUBTRACT)

    # Mirror9: Cut-Extrude10 across plane
    add(cut_extrude10.mirror(Plane(origin=(0, 0, 0), x_dir=(0, 0, 1), z_dir=(1, 0, 0))), mode=Mode.SUBTRACT)

    # Mirror9 copy 1 sketch → Mirror9 copy 1 (cut)
    with BuildSketch(Plane(origin=(0, 0, -0.254), x_dir=(1, 0, 0), z_dir=(0, 0, -1))):
        Polygon((-85.016386052, -25.915795103), (-87.216090578, -22.105795103), (-91.615499629, -22.105795103), (-93.815204154, -25.915795103), (-91.615499629, -29.725795103), (-87.216090578, -29.725795103), align=None)
    extrude(amount=-MIRROR9_COPY_1_DEPTH, mode=Mode.SUBTRACT)


solid = part.part
